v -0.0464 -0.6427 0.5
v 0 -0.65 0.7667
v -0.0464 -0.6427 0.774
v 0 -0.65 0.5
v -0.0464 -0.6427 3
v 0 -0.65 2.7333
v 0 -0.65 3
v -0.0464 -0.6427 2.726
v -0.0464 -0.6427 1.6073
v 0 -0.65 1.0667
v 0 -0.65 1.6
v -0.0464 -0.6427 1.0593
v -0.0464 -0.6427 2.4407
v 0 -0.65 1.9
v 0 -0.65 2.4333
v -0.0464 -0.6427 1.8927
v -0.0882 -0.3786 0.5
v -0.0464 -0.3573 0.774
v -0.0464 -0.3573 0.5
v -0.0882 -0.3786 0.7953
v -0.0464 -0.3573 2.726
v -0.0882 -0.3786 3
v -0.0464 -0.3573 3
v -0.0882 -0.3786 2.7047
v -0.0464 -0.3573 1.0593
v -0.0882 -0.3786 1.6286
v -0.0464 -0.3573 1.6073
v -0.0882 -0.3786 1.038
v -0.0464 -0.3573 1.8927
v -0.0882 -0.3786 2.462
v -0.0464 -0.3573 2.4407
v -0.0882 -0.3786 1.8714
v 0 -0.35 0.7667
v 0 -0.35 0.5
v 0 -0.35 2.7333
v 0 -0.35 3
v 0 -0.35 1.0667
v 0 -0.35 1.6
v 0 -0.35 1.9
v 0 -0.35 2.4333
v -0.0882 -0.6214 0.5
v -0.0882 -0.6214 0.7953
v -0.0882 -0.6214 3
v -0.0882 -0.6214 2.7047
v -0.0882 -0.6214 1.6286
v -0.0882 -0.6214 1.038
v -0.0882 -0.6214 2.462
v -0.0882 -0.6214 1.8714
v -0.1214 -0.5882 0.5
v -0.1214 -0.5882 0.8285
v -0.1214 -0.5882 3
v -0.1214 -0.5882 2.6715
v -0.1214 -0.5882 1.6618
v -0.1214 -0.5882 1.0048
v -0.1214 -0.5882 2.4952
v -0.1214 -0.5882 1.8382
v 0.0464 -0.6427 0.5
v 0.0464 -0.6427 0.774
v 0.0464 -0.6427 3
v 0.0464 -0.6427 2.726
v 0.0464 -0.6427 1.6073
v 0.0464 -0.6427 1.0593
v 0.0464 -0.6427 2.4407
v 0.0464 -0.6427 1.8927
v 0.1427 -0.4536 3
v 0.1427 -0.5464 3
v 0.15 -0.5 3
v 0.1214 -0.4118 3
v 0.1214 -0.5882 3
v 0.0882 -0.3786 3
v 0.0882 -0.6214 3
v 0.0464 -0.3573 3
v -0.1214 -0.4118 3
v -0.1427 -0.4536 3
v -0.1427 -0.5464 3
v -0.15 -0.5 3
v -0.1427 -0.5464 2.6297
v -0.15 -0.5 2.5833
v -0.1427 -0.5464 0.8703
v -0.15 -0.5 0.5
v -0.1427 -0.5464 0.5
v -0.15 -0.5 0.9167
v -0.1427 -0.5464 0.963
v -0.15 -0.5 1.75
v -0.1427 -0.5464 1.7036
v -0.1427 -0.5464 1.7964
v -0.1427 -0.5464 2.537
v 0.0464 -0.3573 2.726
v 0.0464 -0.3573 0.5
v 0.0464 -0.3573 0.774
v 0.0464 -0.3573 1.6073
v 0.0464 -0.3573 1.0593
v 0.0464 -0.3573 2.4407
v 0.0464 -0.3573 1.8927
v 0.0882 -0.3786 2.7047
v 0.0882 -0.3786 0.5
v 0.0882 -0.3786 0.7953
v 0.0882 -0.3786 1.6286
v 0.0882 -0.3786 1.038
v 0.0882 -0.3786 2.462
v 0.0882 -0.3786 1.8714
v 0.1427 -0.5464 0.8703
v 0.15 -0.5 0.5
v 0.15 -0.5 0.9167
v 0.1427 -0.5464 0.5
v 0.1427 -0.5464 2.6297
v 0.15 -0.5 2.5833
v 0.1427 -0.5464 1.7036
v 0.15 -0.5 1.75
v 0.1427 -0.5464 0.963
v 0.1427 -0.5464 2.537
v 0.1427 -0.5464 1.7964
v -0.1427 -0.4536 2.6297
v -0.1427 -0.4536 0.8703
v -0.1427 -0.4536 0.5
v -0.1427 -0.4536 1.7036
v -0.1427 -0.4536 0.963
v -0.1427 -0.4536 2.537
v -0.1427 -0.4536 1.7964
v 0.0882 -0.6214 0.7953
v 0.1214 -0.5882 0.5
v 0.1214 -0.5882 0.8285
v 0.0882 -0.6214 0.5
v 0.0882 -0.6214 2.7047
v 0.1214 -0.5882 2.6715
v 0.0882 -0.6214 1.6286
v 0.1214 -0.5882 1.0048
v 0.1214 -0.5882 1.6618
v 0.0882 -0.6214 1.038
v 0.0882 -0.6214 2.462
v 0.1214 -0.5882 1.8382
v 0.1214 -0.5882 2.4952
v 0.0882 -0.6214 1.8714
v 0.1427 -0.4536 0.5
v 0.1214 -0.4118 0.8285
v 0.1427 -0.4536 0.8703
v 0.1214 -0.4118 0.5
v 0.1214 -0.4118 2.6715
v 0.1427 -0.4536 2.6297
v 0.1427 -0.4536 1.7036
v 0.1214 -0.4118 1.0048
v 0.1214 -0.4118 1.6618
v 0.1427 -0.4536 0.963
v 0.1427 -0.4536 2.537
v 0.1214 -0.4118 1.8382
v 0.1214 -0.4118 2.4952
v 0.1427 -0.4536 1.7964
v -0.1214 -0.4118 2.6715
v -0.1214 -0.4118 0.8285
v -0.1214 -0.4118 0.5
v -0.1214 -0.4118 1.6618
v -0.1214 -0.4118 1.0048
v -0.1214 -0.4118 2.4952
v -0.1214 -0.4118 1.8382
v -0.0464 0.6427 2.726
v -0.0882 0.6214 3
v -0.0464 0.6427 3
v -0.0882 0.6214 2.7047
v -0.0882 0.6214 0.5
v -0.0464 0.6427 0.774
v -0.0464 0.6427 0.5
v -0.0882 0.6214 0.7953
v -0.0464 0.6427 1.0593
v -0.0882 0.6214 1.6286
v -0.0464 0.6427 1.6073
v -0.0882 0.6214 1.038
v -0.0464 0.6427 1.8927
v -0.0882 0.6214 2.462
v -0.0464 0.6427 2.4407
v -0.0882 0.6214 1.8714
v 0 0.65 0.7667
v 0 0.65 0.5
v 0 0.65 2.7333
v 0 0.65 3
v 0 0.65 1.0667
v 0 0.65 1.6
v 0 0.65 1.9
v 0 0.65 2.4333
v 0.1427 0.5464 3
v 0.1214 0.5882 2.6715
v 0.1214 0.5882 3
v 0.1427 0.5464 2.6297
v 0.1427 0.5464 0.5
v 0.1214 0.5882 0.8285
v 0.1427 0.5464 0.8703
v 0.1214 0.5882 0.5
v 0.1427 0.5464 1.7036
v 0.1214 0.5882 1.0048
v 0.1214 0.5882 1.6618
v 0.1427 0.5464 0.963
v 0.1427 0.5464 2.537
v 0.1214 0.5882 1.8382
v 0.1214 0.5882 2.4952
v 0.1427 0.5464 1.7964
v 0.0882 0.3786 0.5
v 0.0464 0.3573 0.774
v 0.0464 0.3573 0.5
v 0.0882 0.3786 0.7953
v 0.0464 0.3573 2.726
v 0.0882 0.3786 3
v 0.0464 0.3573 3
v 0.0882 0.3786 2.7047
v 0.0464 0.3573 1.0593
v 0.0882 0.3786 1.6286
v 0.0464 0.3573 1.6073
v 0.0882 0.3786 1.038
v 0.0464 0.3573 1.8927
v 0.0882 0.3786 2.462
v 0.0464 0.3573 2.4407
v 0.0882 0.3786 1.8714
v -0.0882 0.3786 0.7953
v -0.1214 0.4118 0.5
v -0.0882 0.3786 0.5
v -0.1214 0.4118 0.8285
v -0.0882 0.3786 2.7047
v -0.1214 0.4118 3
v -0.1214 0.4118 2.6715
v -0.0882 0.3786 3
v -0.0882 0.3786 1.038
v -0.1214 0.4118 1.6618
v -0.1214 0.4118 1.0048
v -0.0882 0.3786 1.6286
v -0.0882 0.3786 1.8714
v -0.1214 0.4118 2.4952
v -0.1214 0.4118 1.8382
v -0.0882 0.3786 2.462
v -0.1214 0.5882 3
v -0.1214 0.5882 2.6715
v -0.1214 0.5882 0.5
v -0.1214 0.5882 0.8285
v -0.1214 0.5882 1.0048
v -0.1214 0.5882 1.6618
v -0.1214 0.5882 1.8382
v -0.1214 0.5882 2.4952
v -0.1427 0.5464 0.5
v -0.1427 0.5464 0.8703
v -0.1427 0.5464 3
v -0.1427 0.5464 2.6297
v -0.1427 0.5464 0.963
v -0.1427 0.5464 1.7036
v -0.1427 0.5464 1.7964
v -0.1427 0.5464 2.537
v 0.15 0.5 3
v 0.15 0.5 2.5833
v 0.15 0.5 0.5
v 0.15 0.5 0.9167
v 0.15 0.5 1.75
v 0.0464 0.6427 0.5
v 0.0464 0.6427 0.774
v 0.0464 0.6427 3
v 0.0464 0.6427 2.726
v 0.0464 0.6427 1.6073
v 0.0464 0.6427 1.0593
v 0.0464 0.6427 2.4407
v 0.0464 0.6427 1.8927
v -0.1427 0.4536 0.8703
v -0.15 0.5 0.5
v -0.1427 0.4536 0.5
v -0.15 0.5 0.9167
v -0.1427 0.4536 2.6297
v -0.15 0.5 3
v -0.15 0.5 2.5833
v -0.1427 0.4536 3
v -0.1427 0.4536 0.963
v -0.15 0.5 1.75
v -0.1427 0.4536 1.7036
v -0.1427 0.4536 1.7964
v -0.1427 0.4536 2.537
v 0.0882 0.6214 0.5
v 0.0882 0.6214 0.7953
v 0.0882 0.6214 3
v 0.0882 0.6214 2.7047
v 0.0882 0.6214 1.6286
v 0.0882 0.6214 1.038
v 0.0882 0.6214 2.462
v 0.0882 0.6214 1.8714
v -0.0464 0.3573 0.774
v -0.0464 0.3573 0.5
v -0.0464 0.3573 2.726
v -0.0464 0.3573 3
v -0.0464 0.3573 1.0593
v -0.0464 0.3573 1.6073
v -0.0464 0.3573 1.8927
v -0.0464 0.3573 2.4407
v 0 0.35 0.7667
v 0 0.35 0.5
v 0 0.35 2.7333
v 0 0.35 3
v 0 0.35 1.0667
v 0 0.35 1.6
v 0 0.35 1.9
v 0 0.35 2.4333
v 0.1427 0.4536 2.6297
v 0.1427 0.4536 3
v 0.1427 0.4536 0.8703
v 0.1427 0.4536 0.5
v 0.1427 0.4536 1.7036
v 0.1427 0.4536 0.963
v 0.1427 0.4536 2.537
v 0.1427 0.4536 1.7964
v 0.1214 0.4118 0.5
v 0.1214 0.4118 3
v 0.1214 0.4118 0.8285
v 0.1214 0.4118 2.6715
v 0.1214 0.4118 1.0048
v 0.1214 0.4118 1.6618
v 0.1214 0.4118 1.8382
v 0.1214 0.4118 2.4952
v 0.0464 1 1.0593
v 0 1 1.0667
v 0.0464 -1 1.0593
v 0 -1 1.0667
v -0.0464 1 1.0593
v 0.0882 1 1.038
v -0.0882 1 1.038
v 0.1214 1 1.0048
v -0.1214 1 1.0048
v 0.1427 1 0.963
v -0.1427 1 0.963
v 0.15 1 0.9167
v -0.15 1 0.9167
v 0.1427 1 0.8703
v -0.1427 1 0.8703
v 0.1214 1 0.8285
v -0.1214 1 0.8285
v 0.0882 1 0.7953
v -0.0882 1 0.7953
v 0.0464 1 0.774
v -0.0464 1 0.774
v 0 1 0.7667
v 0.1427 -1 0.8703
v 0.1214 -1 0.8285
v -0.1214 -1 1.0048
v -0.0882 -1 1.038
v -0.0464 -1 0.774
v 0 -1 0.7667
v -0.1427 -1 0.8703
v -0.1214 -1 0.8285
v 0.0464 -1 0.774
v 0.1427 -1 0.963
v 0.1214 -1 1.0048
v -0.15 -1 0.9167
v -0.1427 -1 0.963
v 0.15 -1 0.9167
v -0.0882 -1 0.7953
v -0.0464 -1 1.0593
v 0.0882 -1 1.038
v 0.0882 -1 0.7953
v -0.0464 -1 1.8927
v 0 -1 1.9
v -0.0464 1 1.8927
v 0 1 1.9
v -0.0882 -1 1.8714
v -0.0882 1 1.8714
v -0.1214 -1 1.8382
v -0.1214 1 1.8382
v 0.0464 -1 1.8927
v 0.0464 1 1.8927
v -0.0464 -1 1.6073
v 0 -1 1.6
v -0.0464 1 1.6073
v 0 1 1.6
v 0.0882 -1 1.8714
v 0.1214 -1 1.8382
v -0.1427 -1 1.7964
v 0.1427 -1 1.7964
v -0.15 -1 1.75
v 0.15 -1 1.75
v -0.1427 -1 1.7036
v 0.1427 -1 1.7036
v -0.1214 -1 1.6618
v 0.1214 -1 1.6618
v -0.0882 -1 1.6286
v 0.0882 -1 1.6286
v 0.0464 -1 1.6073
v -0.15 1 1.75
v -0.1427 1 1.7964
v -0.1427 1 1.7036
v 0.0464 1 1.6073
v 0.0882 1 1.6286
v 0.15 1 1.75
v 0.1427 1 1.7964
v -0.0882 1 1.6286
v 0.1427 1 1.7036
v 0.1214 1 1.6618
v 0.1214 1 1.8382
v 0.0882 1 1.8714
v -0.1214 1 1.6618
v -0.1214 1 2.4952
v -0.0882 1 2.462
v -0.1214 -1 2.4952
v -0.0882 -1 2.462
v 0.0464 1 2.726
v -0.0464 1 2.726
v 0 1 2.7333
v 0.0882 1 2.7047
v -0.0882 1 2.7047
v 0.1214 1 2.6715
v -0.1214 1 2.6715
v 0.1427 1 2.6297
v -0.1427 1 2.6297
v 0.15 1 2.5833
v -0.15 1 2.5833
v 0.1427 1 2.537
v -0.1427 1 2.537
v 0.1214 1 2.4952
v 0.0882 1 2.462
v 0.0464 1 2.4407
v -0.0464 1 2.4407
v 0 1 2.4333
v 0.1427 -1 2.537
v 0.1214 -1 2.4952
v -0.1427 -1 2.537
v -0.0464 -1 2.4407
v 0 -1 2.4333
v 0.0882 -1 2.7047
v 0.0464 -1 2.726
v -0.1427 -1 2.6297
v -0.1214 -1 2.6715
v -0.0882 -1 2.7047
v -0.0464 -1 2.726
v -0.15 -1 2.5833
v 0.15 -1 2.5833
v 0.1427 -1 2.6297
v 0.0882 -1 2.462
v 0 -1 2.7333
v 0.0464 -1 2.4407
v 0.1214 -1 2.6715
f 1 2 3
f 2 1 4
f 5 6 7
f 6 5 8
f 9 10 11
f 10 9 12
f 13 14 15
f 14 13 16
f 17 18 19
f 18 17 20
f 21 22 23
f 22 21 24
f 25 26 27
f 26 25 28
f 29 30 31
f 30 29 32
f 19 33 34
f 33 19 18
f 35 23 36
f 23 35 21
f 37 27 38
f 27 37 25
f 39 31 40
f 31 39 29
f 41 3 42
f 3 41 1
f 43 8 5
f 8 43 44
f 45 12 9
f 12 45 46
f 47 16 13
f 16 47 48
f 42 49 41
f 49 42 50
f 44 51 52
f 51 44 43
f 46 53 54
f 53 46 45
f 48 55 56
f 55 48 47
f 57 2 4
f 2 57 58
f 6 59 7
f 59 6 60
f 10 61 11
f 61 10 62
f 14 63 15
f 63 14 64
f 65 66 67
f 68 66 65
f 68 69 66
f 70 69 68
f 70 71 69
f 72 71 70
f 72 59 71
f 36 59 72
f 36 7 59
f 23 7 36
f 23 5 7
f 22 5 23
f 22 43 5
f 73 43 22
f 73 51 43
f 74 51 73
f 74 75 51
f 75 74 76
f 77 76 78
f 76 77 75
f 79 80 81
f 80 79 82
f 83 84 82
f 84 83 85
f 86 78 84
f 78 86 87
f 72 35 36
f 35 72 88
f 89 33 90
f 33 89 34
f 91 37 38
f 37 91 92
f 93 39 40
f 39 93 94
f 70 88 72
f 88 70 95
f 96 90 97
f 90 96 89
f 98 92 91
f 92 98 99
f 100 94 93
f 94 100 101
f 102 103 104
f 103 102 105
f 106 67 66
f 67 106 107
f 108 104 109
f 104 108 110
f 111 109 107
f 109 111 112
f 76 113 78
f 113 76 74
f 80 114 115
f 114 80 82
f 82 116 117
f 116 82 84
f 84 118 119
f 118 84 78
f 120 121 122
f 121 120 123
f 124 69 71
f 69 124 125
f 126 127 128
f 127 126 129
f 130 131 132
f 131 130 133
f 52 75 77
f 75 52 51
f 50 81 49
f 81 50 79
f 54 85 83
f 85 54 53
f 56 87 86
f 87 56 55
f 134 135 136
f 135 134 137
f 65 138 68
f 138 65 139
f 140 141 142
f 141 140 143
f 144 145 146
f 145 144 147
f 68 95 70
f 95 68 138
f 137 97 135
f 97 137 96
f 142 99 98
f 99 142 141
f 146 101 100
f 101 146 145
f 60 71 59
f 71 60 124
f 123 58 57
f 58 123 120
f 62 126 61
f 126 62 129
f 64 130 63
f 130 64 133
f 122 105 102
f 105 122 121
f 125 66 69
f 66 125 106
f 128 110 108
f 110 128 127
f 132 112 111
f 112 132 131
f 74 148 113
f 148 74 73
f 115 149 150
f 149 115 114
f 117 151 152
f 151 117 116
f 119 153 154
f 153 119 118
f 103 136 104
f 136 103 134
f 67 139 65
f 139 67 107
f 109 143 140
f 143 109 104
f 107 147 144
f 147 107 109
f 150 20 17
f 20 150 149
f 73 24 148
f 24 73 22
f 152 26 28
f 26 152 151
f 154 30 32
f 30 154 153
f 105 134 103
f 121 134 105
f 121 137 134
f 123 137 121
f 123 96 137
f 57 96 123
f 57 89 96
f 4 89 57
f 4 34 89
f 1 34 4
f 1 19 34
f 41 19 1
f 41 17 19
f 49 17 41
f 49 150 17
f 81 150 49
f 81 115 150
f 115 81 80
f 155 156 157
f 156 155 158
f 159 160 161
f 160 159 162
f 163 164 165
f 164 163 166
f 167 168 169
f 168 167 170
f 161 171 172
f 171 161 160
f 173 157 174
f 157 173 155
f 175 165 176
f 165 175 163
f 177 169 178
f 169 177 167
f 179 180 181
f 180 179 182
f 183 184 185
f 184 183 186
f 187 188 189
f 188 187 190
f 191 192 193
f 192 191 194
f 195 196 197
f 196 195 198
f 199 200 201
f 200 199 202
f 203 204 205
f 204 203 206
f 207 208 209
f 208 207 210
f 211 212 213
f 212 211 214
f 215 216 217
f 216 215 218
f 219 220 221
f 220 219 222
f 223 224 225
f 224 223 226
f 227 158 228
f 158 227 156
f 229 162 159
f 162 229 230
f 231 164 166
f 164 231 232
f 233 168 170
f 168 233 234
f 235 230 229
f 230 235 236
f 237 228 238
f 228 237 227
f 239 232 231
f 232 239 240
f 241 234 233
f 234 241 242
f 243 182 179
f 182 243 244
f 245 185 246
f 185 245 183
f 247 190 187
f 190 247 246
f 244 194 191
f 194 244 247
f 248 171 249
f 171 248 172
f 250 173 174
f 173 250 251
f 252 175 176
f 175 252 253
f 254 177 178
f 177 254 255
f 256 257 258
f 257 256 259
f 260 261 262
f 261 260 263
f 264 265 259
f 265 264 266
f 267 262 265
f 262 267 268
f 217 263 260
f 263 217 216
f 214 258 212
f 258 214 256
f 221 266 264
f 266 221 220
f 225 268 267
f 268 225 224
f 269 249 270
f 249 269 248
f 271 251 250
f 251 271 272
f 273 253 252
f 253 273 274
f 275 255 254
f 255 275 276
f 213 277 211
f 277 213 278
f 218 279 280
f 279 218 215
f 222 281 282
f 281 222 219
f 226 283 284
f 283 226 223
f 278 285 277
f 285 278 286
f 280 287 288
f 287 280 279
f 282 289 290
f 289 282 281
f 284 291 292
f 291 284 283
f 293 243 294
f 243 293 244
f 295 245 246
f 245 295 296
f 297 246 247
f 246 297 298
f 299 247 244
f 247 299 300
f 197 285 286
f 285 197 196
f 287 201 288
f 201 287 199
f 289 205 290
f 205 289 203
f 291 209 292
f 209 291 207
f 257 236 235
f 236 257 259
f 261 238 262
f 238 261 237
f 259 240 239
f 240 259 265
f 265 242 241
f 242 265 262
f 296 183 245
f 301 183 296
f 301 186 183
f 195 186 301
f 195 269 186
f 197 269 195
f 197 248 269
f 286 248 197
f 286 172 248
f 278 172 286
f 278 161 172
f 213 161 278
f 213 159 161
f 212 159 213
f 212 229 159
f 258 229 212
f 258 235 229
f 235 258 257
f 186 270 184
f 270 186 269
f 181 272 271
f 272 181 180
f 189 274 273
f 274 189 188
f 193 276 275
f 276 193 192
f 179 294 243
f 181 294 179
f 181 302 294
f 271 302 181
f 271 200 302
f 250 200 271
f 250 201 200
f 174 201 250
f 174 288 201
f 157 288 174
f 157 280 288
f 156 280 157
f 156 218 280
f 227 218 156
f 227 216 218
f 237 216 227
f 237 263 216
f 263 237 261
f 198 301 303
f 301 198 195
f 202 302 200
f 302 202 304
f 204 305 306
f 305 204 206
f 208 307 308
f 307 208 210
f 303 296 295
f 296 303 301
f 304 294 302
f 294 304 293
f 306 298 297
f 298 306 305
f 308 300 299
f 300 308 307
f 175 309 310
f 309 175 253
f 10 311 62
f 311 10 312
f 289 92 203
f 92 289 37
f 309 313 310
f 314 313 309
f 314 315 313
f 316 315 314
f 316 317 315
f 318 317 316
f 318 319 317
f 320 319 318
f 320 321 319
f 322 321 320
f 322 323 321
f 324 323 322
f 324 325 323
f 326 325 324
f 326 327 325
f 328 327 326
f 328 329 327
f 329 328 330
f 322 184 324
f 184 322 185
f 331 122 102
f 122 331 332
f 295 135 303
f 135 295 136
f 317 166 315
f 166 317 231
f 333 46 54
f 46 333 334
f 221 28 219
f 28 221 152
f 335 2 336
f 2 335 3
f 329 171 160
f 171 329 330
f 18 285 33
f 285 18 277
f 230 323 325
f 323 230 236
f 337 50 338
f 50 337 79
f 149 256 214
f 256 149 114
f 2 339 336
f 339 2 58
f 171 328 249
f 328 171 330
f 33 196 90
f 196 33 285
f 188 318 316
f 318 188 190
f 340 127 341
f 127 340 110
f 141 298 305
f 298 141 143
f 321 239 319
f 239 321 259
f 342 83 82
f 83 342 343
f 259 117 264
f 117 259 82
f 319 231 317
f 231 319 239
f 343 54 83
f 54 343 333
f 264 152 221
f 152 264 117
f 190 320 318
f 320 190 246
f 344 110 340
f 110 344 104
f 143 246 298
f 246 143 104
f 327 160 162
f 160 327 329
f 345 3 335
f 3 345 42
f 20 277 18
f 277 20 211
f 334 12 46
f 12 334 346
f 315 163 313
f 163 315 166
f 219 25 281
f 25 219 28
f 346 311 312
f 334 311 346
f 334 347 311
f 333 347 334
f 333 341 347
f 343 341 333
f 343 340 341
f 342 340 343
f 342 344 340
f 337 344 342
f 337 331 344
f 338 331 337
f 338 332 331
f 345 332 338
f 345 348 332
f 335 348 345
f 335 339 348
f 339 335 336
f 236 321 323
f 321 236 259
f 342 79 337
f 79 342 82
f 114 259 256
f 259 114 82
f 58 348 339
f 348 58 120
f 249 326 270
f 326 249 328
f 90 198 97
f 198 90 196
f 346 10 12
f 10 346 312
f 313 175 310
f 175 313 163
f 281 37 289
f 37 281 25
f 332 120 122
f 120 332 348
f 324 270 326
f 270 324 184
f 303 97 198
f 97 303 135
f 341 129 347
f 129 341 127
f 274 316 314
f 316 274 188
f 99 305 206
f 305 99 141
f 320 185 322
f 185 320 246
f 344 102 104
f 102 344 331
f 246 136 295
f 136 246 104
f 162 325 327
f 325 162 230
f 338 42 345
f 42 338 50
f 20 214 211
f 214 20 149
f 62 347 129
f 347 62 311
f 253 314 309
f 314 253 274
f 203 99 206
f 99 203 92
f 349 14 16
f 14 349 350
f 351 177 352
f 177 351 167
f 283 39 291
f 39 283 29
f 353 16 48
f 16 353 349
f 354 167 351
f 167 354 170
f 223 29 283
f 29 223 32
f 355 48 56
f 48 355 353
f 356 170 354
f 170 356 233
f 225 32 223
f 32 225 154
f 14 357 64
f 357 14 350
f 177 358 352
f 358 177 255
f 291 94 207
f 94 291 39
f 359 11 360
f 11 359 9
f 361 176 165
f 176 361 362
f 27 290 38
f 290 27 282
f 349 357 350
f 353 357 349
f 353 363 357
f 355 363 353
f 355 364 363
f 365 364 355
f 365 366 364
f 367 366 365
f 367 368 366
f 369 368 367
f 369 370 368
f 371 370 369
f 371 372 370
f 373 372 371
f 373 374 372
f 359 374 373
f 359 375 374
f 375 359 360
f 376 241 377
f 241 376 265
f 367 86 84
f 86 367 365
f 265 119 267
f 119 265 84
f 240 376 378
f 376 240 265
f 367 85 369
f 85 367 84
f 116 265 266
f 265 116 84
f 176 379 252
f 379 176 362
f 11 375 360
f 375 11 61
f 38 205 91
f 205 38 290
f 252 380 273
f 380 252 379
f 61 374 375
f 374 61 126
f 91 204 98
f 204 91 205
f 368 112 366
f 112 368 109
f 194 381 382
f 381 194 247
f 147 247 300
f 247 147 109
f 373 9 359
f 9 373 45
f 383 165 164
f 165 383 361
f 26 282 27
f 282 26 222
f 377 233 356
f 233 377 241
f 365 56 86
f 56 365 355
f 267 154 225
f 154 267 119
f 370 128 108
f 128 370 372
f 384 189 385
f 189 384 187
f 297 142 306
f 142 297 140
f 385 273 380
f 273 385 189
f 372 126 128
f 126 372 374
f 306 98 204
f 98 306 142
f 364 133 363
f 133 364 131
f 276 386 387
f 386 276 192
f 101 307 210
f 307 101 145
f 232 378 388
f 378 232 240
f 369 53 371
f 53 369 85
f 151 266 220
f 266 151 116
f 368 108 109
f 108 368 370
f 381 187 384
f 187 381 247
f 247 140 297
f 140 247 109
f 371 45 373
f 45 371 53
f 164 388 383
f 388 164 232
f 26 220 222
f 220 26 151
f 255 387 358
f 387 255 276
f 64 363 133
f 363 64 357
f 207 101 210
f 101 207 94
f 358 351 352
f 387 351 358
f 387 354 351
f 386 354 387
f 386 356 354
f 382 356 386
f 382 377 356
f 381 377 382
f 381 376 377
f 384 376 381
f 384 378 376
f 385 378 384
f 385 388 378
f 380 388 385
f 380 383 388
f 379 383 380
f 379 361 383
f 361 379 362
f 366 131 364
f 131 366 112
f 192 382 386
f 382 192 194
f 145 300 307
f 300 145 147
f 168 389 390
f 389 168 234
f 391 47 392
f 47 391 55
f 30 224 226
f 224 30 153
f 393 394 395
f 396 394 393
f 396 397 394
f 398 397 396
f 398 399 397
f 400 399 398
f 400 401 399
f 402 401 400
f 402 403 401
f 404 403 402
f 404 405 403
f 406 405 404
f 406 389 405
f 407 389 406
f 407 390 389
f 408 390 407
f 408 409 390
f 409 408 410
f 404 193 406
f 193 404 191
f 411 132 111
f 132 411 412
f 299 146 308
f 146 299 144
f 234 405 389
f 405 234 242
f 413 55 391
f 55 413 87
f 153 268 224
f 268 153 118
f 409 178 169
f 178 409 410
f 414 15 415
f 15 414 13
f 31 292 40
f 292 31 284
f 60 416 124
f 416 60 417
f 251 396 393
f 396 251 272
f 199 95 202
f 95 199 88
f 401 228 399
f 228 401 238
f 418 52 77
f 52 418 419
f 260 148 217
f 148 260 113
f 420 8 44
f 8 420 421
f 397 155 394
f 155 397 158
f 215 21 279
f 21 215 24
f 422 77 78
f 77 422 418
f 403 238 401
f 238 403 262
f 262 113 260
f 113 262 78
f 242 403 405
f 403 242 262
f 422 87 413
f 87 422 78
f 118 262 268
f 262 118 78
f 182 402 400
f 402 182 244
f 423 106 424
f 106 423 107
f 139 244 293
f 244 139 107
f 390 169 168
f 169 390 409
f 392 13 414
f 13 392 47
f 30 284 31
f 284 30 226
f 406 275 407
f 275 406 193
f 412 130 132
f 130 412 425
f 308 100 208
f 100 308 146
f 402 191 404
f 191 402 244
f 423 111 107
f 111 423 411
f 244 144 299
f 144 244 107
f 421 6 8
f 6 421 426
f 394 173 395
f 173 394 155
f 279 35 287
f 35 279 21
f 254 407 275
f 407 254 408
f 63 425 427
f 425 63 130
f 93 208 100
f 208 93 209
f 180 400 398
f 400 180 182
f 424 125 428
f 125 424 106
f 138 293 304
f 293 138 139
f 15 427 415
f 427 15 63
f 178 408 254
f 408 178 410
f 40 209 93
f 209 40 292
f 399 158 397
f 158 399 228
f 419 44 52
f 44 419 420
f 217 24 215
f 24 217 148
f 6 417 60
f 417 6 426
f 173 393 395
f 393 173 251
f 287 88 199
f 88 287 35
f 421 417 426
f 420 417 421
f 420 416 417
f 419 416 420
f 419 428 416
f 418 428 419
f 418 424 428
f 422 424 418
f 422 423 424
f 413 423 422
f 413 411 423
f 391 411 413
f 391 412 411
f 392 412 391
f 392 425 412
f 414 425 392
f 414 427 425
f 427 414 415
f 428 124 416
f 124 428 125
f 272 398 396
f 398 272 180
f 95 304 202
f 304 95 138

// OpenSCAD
module bound_box()
{
	translate([-1,-1,0])
		cube([2,2,3]);
}

module built_armor_stand()
{
	head_radius = 0.38;
	stand_radius = 0.12;
	stand_height = 1.5;
	base_radius = 0.6;
	base_height = 0.1;
	shoulder_width = 1.25;
	shoulder_height = 0.25;
	
	translate([0,0,.5])
		union()
		{
			cylinder(r = base_radius, h = base_height, $fn = 20);
			translate([0,0,base_height])
				cylinder(r = stand_radius, h = stand_height, $fn = 20);
			translate([0,0,stand_height + 0.2])
				sphere(r = head_radius, $fn = 20);
			translate([-shoulder_width/2,-.3/2,.9])
				cube([shoulder_width,.3,shoulder_height]);			
		}
}

module built_burial_receptacle()
{
	cof_width = 1;
	cof_height = 2.25;
	cof_depth = .6;
	
	translate([0,0,.5])
		union()
		{
			hull()
			{	
				translate([0,0,cof_height/2])
					cube([cof_width,cof_depth,cof_height], center = true);
				translate([0,0,.005 + 1.5])
					cube([cof_width + 0.8,cof_depth,.01], center = true);
			}
			
			translate([.55,-cof_depth/2,1.1])
				rotate([0,90,0])
					rotate_extrude(convexity = 10, $fn = 15)
						translate([.1,0,0])
							circle(r = .025, $fn = 15);
							
			translate([-.3,cof_depth/2,0])
				cylinder(r = 0.08, h = 2.4, $fn = 20);
			translate([.3,cof_depth/2,0])
				cylinder(r = 0.08, h = 2.5, $fn = 20);
		}
}

module built_door_x()
{
	door_height = 2.5;
	door_width = 2;
	door_depth = .5;
	
	translate([0,0,.5])
		union()
		{
			translate([0,0,door_height/2])
				difference()
				{
					cube([door_width,door_depth,door_height],center = true);
					for(x = [-door_width/4,door_width/4], y = [-door_depth/2,door_depth/2], z = [-door_height/4,door_height/4])
					{
						translate([x,y,z])
							hull()
							{
								cube([.5,.2,.5],center = true);
								cube([.75,.001,.75],center = true);
							}
					}
				}
			
			for(y = [-door_depth/2,door_depth/2])
			{
				translate([door_width/2 - .2,y,1.25])
					rotate([0,90,0])
						rotate_extrude(convexity = 10, $fn = 15)
							translate([.1,0,0])
								circle(r = .025, $fn = 15);		
			}
		}
}

module built_door_y()
{
	door_height = 2.5;
	door_width = 2;
	door_depth = .5;
	
	translate([0,0,.5])
	rotate([0,0,90])
		union()
		{
			translate([0,0,door_height/2])
				difference()
				{
					cube([door_width,door_depth,door_height],center = true);
					for(x = [-door_width/4,door_width/4], y = [-door_depth/2,door_depth/2], z = [-door_height/4,door_height/4])
					{
						translate([x,y,z])
							hull()
							{
								cube([.5,.2,.5],center = true);
								cube([.75,.001,.75],center = true);
							}
					}
				}
			
			for(y = [-door_depth/2,door_depth/2])
			{
				translate([door_width/2 - .2,y,1.25])
					rotate([0,90,0])
						rotate_extrude(convexity = 10, $fn = 15)
							translate([.1,0,0])
								circle(r = .025, $fn = 15);		
			}
		}
}

module built_floodgate_x()
{
	f_height = 2.5;
	f_width = 2;
	f_depth = .3;
	
	translate([0,0,.5 + f_height/2])
	union()
	{
		cube([f_width,f_depth,f_height],center = true);
		
		for(y = [f_depth/2,-f_depth/2], z = [0,2*f_height/5,-2*f_height/5])
		{
			translate([0,y,z])
				cube([f_width,.2,f_height/10],center = true);
		}
		
		for(x = [f_width/4,-f_width/4], y = [f_depth/2,-f_depth/2])
		{
			translate([x,y,0])
				cube([f_width/6,.2,f_height],center = true);
		}
		
		difference()
		{
			for(x = [f_width/4,-f_width/4])
			{
					translate([x,0,-f_height/2 - .15])
						rotate([0,90,0])
							rotate_extrude(convexity = 10, $fn = 20)
								translate([.75,0,0])
									circle(r = .125, $fn = 20);		
			}
			
			translate([-5,-5,-10 - f_height/2])
				cube([10,10,10]);
		}
	}
}

module built_floodgate_y()
{
	f_height = 2.5;
	f_width = 2;
	f_depth = .3;
	
	translate([0,0,.5 + f_height/2])
	rotate([0,0,90])
	union()
	{
		cube([f_width,f_depth,f_height],center = true);
		
		for(y = [f_depth/2,-f_depth/2], z = [0,2*f_height/5,-2*f_height/5])
		{
			translate([0,y,z])
				cube([f_width,.2,f_height/10],center = true);
		}
		
		for(x = [f_width/4,-f_width/4], y = [f_depth/2,-f_depth/2])
		{
			translate([x,y,0])
				cube([f_width/6,.2,f_height],center = true);
		}
		
		difference()
		{
			for(x = [f_width/4,-f_width/4])
			{
					translate([x,0,-f_height/2 - .15])
						rotate([0,90,0])
							rotate_extrude(convexity = 10, $fn = 20)
								translate([.75,0,0])
									circle(r = .125, $fn = 20);		
			}
			
			translate([-5,-5,-10 - f_height/2])
				cube([10,10,10]);
		}
	}
}

module built_floor_hatch()
{
	translate([0,0,.5 + .125/2])
		union()
		{
			cube([1.5,1.5,.125],center = true);
			
			translate([0,0,.125])
				cube([1.25,1.25,.125],center = true);

			translate([0,.4,.25 - .05])
				cube([1.25,.1,.05],center = true);

			translate([0,-.4,.25 - .05])
				cube([1.25,.1,.05],center = true);
				
			translate([.6,0,.18])
				rotate([0,12,0])
					rotate_extrude(convexity = 10, $fn = 20)
						translate([.1,0,0])
							circle(r = .02, $fn = 20);	
		}
}

module built_wall_grate_x()
{
	w_h = 2.5;
	w_w = 2;
	
	translate([0,0,.5])
		union()
		{
			for(x = [-w_w/4,w_w/4])
			{
				translate([x,0,0])
					cylinder(r = .15,h = w_h, $fn = 20);
			}
			for(z = [1*w_h/6,3*w_h/6,5*w_h/6])
			{
				translate([-w_w/2,0,z])
					rotate([0,90,0])
						cylinder(r = .15, h = w_w, $fn = 20);
			}
		}
}

module built_wall_grate_y()
{
	w_h = 2.5;
	w_w = 2;
	
	translate([0,0,.5])
	rotate([0,0,90])
		union()
		{
			for(x = [-w_w/4,w_w/4])
			{
				translate([x,0,0])
					cylinder(r = .15,h = w_h, $fn = 20);
			}
			for(z = [1*w_h/6,3*w_h/6,5*w_h/6])
			{
				translate([-w_w/2,0,z])
					rotate([0,90,0])
						cylinder(r = .15, h = w_w, $fn = 20);
			}
		}
}


%bound_box();
built_wall_grate_y();
